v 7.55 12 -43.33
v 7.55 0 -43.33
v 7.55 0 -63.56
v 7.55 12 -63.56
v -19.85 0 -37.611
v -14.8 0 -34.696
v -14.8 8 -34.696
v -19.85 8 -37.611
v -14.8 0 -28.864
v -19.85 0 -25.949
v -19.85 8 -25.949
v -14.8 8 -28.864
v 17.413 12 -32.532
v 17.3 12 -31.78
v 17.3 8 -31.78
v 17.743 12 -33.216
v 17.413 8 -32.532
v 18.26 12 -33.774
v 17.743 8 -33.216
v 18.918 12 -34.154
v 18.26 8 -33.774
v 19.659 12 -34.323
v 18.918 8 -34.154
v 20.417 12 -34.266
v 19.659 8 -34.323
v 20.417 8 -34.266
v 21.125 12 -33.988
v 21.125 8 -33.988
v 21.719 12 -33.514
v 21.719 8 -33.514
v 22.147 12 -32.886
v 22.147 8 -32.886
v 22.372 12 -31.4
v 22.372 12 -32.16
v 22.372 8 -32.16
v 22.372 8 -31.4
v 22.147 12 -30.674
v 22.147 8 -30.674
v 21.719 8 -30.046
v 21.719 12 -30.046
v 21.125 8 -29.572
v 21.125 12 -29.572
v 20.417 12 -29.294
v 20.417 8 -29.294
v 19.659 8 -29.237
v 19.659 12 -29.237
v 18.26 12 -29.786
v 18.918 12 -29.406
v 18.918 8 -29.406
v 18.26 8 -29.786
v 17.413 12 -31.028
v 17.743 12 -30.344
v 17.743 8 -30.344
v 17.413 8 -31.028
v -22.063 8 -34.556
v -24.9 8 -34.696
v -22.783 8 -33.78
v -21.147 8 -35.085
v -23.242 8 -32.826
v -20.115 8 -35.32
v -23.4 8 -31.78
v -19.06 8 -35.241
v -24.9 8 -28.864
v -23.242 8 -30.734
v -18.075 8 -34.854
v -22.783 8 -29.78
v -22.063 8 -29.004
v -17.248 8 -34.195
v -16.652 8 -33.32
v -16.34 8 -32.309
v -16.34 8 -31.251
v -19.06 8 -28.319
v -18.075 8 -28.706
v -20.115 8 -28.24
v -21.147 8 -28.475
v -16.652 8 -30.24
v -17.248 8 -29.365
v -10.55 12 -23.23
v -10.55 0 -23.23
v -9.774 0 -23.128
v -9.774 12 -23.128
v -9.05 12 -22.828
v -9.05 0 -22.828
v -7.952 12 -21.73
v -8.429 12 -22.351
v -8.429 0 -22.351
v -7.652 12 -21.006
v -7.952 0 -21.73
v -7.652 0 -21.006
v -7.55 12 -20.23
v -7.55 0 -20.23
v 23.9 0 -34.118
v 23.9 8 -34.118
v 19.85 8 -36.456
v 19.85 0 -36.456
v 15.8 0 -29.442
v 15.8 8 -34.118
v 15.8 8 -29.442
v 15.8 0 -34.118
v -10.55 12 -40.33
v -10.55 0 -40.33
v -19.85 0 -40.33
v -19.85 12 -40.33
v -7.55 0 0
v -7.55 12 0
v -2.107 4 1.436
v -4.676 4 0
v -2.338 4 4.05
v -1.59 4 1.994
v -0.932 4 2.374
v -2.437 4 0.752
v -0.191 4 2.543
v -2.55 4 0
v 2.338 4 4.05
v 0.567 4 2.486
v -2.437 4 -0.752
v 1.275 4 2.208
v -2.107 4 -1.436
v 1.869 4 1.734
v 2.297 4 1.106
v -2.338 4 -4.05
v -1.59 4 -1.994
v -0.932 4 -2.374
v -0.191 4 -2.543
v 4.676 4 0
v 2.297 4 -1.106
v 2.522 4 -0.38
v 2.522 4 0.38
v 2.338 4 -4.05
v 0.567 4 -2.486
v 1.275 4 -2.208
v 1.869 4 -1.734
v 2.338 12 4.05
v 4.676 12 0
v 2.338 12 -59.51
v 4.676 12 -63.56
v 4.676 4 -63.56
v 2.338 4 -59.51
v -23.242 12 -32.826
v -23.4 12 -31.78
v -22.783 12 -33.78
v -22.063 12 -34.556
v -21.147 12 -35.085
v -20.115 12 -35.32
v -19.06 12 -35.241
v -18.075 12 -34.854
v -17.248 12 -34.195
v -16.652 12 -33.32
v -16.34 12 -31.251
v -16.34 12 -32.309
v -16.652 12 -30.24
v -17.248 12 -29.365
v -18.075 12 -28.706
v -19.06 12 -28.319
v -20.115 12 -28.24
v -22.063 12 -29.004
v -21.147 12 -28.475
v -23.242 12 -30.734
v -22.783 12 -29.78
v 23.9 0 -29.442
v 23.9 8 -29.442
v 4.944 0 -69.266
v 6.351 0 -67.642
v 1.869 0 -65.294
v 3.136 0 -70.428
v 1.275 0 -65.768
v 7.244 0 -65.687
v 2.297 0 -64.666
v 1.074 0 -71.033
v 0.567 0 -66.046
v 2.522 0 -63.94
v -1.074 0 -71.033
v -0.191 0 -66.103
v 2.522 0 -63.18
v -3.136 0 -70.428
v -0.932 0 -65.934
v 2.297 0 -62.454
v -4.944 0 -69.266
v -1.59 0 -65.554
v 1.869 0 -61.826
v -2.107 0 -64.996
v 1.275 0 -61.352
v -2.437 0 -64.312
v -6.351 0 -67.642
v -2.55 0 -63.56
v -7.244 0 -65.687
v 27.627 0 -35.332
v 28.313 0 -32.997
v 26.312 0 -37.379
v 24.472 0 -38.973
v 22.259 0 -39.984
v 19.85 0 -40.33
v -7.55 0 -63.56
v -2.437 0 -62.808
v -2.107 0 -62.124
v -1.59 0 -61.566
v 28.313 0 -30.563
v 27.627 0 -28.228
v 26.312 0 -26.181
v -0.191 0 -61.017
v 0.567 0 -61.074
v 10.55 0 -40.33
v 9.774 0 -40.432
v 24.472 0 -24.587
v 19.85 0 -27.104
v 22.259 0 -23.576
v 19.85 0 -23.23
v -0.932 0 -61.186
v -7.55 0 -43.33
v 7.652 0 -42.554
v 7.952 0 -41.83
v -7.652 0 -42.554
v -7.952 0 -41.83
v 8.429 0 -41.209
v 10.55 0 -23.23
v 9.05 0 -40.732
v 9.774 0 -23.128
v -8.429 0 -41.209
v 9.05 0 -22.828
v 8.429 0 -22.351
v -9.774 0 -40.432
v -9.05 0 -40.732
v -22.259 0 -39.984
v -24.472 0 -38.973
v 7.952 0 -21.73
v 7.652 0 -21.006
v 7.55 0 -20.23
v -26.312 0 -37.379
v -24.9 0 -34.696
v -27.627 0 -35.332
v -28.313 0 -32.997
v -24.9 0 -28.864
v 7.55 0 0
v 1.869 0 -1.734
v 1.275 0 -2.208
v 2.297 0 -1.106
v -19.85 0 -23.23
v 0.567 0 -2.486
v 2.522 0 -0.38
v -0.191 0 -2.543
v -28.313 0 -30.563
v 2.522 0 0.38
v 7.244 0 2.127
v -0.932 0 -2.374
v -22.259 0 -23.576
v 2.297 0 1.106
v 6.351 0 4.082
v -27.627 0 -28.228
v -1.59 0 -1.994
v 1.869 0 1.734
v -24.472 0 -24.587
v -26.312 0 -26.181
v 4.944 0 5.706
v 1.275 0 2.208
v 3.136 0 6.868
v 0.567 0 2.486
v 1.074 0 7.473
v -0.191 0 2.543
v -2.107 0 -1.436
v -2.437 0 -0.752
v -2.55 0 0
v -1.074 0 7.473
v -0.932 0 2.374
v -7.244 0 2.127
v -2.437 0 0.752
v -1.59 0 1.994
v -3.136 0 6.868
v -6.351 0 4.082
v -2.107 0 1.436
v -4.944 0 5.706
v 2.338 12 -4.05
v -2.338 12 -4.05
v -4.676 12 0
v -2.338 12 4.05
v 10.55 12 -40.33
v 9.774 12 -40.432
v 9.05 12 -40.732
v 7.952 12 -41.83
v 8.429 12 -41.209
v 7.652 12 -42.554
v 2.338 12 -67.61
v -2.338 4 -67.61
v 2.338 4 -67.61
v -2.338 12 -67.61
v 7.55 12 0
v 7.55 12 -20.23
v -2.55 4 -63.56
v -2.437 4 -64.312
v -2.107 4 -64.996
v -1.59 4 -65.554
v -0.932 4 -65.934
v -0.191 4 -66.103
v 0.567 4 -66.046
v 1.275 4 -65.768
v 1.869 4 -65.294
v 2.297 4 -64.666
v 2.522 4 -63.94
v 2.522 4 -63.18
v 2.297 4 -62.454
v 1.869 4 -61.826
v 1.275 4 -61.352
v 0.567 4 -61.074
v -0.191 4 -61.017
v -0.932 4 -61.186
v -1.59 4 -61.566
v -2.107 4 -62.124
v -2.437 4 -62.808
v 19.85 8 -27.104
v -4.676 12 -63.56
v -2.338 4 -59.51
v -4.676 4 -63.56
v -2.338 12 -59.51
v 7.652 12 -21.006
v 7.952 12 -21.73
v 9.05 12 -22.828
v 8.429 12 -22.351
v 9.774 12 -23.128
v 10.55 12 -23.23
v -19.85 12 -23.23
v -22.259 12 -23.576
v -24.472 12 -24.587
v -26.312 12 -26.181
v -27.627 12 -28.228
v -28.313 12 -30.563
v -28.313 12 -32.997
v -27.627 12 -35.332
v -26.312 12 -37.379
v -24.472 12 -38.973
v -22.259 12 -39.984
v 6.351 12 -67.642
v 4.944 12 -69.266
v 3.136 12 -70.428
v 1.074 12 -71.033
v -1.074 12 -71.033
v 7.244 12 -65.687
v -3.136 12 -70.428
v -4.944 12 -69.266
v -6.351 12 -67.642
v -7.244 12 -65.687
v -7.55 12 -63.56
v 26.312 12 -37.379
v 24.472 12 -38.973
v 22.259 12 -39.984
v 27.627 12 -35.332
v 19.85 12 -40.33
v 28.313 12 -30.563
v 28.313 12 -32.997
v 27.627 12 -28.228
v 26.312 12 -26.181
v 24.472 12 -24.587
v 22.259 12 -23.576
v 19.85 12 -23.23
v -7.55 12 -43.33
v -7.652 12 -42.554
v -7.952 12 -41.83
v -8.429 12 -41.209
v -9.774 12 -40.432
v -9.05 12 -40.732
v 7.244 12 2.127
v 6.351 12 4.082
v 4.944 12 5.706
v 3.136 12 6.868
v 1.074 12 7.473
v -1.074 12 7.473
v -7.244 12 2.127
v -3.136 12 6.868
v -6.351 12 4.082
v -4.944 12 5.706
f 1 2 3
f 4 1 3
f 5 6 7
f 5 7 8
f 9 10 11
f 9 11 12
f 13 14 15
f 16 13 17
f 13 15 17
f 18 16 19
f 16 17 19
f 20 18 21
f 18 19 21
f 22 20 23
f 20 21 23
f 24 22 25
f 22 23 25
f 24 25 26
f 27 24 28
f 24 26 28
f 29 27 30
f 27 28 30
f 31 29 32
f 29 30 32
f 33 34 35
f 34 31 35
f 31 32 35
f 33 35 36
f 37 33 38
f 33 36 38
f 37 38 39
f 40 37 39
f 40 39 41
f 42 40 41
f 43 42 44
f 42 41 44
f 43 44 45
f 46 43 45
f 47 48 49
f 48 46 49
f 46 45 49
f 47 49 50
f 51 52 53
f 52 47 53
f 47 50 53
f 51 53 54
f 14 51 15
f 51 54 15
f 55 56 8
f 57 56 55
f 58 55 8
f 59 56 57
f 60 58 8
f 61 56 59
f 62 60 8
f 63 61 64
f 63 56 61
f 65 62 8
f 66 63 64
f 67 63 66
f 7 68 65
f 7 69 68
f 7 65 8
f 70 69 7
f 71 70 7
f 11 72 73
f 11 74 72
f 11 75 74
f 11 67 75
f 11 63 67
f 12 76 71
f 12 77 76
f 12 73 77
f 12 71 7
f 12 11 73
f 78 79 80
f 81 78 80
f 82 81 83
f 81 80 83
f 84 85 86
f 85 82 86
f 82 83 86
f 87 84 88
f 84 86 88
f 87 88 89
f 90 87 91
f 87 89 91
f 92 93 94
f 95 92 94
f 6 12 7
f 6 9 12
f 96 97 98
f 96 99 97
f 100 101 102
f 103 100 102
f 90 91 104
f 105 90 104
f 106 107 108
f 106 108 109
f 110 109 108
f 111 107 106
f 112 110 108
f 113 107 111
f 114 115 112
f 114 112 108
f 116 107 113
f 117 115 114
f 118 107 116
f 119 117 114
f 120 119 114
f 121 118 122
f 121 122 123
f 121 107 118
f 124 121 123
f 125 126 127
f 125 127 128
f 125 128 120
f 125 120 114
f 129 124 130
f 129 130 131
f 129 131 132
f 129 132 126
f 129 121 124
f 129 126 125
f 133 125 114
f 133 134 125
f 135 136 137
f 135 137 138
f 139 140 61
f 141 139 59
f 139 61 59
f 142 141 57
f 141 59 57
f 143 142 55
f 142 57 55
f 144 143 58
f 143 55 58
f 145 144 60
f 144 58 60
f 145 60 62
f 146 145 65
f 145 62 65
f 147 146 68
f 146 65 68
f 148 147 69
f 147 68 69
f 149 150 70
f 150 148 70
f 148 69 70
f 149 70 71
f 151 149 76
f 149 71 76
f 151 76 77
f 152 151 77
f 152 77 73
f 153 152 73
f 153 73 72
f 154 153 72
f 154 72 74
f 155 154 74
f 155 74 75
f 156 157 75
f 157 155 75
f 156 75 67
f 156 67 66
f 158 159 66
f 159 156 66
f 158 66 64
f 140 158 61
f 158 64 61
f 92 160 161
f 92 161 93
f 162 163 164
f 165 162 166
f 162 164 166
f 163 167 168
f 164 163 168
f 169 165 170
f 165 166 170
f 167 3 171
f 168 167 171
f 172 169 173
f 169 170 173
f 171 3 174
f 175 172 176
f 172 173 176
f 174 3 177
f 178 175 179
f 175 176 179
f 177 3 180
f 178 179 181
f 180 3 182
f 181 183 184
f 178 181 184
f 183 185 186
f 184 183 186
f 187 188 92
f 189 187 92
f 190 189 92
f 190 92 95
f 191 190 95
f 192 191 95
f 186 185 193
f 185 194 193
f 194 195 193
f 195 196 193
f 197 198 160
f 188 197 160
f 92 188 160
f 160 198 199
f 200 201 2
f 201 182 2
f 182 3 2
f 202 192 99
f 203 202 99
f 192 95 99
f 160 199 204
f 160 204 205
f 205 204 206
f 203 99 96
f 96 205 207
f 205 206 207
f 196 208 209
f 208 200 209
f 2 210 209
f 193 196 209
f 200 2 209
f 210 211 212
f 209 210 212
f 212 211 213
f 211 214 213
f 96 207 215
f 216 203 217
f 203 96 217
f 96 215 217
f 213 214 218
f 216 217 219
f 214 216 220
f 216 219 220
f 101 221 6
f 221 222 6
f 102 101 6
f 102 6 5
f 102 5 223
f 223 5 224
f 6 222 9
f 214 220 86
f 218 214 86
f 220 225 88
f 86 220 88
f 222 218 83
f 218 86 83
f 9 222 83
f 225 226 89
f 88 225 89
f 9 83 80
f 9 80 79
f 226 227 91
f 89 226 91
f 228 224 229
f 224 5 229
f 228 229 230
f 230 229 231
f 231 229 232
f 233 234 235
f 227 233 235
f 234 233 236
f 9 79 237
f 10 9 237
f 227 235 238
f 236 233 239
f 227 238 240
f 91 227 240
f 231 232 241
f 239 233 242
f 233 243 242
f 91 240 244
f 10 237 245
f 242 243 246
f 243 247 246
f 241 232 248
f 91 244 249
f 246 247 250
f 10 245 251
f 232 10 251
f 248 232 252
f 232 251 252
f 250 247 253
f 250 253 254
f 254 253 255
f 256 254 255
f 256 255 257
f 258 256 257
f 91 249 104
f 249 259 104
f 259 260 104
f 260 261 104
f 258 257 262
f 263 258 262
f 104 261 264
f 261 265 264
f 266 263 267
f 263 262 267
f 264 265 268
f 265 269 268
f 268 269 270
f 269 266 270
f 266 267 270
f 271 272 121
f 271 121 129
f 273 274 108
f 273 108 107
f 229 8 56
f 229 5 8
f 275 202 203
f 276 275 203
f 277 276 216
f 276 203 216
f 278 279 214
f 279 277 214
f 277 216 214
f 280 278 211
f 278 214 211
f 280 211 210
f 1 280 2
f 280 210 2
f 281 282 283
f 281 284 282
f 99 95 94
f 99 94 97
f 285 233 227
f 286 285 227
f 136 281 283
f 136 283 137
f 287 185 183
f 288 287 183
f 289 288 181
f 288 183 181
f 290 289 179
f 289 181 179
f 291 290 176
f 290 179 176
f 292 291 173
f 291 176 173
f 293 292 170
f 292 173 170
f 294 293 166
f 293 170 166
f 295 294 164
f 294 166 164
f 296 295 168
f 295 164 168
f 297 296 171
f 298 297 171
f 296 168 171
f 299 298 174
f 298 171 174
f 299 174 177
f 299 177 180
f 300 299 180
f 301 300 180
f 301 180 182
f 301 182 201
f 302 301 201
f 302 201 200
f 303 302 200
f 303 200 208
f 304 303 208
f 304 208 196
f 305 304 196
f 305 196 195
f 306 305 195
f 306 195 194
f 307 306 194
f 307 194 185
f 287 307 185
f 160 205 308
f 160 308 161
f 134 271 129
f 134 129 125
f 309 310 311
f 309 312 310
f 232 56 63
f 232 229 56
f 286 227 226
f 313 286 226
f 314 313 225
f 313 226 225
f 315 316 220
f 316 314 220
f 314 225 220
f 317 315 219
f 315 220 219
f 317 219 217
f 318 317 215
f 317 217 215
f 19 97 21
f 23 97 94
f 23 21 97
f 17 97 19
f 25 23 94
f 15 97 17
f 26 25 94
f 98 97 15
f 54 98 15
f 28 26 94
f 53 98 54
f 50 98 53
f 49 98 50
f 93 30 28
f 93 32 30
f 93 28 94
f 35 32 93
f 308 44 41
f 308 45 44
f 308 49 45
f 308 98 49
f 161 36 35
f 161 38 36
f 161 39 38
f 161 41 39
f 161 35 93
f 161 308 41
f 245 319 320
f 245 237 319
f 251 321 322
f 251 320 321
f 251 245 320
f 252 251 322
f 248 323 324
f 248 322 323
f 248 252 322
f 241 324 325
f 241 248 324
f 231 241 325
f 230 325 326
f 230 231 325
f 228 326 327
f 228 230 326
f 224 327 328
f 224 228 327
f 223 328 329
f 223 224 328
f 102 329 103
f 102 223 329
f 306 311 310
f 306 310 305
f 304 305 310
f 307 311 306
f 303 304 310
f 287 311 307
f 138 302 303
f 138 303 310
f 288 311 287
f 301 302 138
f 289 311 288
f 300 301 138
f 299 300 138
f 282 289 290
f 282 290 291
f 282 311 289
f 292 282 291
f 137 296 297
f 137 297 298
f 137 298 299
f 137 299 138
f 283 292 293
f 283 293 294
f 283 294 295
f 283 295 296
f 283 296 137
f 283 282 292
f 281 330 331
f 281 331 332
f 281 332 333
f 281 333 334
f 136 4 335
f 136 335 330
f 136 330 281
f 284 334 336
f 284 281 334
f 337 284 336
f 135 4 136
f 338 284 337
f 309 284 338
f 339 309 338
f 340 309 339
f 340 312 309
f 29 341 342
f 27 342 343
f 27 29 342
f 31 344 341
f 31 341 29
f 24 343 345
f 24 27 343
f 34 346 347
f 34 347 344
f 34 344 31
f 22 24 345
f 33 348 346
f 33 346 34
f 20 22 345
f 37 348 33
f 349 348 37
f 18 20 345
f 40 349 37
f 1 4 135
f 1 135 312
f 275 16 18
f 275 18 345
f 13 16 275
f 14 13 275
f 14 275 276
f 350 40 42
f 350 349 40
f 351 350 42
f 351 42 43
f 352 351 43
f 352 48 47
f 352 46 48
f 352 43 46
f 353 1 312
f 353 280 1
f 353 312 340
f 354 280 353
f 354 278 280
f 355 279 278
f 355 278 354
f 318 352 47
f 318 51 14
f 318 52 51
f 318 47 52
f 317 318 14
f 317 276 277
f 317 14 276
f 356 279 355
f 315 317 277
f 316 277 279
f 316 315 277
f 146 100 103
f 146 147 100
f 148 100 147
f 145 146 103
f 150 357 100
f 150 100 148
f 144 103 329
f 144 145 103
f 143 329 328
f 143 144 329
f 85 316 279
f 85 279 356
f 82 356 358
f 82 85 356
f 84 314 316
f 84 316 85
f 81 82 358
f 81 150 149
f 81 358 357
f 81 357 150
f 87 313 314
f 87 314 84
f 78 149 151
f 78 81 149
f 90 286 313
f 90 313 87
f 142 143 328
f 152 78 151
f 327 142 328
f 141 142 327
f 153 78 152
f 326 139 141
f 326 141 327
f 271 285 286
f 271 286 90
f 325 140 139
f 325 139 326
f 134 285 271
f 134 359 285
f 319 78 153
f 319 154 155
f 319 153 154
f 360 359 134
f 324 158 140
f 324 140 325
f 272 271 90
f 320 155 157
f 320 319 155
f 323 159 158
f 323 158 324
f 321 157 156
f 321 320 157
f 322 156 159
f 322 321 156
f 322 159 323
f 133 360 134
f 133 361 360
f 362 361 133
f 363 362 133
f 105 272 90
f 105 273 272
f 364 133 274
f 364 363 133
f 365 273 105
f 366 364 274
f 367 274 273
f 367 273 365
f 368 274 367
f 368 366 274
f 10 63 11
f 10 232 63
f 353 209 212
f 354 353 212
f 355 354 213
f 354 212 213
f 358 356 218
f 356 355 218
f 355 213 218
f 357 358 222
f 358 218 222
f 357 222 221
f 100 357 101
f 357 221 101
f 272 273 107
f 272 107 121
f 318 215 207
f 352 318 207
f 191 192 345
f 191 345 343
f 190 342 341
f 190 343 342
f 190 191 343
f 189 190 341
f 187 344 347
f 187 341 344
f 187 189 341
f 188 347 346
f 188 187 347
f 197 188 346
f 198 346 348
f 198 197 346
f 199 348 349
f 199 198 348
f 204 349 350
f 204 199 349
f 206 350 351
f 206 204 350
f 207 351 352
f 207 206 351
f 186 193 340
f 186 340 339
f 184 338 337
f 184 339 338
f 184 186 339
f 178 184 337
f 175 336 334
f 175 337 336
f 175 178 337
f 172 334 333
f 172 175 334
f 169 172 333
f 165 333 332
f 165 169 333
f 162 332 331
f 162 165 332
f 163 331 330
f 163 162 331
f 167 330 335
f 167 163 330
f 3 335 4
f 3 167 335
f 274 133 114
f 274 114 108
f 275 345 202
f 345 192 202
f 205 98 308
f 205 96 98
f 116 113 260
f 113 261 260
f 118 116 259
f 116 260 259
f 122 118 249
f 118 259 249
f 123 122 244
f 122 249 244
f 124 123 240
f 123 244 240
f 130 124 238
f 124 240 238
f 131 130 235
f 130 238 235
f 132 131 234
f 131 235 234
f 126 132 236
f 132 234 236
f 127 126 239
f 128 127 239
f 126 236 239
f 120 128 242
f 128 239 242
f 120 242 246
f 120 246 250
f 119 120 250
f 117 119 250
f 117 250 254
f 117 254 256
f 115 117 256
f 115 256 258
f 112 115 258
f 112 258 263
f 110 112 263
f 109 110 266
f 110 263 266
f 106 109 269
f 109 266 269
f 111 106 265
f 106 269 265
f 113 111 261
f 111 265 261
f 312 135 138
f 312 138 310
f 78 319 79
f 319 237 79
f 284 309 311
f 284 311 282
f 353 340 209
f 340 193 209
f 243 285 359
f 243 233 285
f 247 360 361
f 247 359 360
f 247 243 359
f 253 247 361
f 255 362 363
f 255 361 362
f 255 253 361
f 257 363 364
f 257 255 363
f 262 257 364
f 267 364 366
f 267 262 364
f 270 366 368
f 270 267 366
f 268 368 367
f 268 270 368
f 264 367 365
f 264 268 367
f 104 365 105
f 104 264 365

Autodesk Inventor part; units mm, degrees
ref_plane "YZ Plane" through (0, 0, 0) normal (1, 0, 0) x (0, 1, 0)
ref_plane "XZ Plane" through (0, 0, 0) normal (0, 1, 0) x (-1, 0, 0)
ref_plane "XY Plane" through (0, 0, 0) normal (0, 0, 1) x (1, 0, 0)
sketch "Sketch1" plane through (0, 0, 0) normal (0, 1, 0) x (-1, 0, 0)
  circle A0 centre (0, 0) radius 2.55
  circle A1 centre (0, -63.56) radius 2.55
  line L0 (0, 0) -> (0, -63.56) construction
  line L1 (0, 0) -> (0, -63.56) construction
  line L2 (-7.55, 0) -> (-7.55, -20.23)
  line L3 (7.55, -63.56) -> (7.55, -43.33)
  arc A2 (7.55, 0) -> (-7.55, 0) centre (0, 0) ccw
  arc A3 (-7.55, -63.56) -> (7.55, -63.56) centre (0, -63.56) ccw
  line L4 (19.85, -31.78) -> (-19.85, -31.78) construction
  circle A4 centre (19.85, -31.78) radius 3.55
  circle A5 centre (-19.85, -31.78) radius 2.55
  line L5 (19.85, -31.78) -> (-19.85, -31.78) construction
  line L6 (19.85, -23.23) -> (10.55, -23.23)
  line L7 (-19.85, -40.33) -> (-10.55, -40.33)
  arc A6 (19.85, -40.33) -> (19.85, -23.23) centre (19.85, -31.78) ccw
  arc A7 (-19.85, -23.23) -> (-19.85, -40.33) centre (-19.85, -31.78) ccw
  line L8 (7.55, -40.33) -> (7.55, -23.23) construction
  line L9 (-7.55, -43.33) -> (-7.55, -63.56)
  line L10 (-7.55, -23.23) -> (-7.55, -40.33) construction
  line L11 (7.55, -20.23) -> (7.55, 0)
  line L12 (7.55, -23.23) -> (-7.55, -23.23) construction
  line L13 (-10.55, -23.23) -> (-19.85, -23.23)
  line L14 (10.55, -40.33) -> (19.85, -40.33)
  line L15 (-7.55, -40.33) -> (7.55, -40.33) construction
  arc A8 (7.55, -20.23) -> (10.55, -23.23) centre (10.55, -20.23) ccw
  arc A9 (-10.55, -23.23) -> (-7.55, -20.23) centre (-10.55, -20.23) ccw
  arc A10 (-7.55, -43.33) -> (-10.55, -40.33) centre (-10.55, -43.33) ccw
  arc A11 (10.55, -40.33) -> (7.55, -43.33) centre (10.55, -43.33) ccw
  point P0 (0, -31.78)
  point P1 (0, -31.78)
  point P2 (0, -31.78)
  dimension "d0" = 5.1
  dimension "d1" = 5.1
  dimension "d2" = 63.56
  dimension "d3" = 5
  dimension "d18" = 39.7
  dimension "d19" = 7.1
  dimension "d20" = 5.1
  dimension "d22" = 3
  dimension "d31" = 5
extrude "Extrusion1" add sketch "Sketch1" along normal blind 12
sketch "Sketch5" plane through (0, 12, 0) normal (0, 1, 0) x (1, 0, 0)
  line L0 (2.3383, 4.05) -> (4.6765, 0)
  line L1 (4.6765, 0) -> (2.3383, -4.05)
  line L2 (2.3383, -4.05) -> (-2.3383, -4.05)
  line L3 (-2.3383, -4.05) -> (-4.6765, 0)
  line L4 (-4.6765, 0) -> (-2.3383, 4.05)
  line L5 (-2.3383, 4.05) -> (2.3383, 4.05)
  circle A0 centre (0, 63.56) radius 2.55 projected
  line L6 (-2.3383, 59.51) -> (-4.6765, 63.56)
  line L7 (-4.6765, 63.56) -> (-2.3383, 67.61)
  line L8 (-2.3383, 67.61) -> (2.3383, 67.61)
  line L9 (2.3383, 67.61) -> (4.6765, 63.56)
  line L10 (4.6765, 63.56) -> (2.3383, 59.51)
  line L11 (2.3383, 59.51) -> (-2.3383, 59.51)
  point P0 (0, 0)
  point P1 (0, 0)
  dimension "d23" = 8.1
  dimension "d24" = 8.1
extrude "Extrusion4" cut sketch "Sketch5" against normal blind 8 contours L0 L1 L2 L3 L4 L5 | A0 | L6 L7 L8 L9 L10 L11
sketch "Sketch6" plane through (0, 0, 0) normal (0, -1, 0) x (1, 0, 0)
  circle A0 centre (-19.85, -31.78) radius 3.55 projected
  line L0 (-14.8, -28.8644) -> (-14.8, -34.6956)
  line L1 (-14.8, -34.6956) -> (-19.85, -37.6112)
  line L2 (-19.85, -37.6112) -> (-24.9, -34.6956)
  line L3 (-24.9, -34.6956) -> (-24.9, -28.8644)
  line L4 (-24.9, -28.8644) -> (-19.85, -25.9488)
  line L5 (-19.85, -25.9488) -> (-14.8, -28.8644)
  circle A1 centre (19.85, -31.78) radius 2.55 projected
  line L6 (15.8, -34.1183) -> (15.8, -29.4417)
  line L7 (15.8, -29.4417) -> (19.85, -27.1035)
  line L8 (19.85, -27.1035) -> (23.9, -29.4417)
  line L9 (23.9, -29.4417) -> (23.9, -34.1183)
  line L10 (23.9, -34.1183) -> (19.85, -36.4565)
  line L11 (19.85, -36.4565) -> (15.8, -34.1183)
  point P0 (0, 0)
  dimension "d27" = 10.1
  dimension "d28" = 8.1
extrude "Extrusion5" cut sketch "Sketch6" against normal blind 8
properties part number "Acoplador" material "ABS Plastic"
